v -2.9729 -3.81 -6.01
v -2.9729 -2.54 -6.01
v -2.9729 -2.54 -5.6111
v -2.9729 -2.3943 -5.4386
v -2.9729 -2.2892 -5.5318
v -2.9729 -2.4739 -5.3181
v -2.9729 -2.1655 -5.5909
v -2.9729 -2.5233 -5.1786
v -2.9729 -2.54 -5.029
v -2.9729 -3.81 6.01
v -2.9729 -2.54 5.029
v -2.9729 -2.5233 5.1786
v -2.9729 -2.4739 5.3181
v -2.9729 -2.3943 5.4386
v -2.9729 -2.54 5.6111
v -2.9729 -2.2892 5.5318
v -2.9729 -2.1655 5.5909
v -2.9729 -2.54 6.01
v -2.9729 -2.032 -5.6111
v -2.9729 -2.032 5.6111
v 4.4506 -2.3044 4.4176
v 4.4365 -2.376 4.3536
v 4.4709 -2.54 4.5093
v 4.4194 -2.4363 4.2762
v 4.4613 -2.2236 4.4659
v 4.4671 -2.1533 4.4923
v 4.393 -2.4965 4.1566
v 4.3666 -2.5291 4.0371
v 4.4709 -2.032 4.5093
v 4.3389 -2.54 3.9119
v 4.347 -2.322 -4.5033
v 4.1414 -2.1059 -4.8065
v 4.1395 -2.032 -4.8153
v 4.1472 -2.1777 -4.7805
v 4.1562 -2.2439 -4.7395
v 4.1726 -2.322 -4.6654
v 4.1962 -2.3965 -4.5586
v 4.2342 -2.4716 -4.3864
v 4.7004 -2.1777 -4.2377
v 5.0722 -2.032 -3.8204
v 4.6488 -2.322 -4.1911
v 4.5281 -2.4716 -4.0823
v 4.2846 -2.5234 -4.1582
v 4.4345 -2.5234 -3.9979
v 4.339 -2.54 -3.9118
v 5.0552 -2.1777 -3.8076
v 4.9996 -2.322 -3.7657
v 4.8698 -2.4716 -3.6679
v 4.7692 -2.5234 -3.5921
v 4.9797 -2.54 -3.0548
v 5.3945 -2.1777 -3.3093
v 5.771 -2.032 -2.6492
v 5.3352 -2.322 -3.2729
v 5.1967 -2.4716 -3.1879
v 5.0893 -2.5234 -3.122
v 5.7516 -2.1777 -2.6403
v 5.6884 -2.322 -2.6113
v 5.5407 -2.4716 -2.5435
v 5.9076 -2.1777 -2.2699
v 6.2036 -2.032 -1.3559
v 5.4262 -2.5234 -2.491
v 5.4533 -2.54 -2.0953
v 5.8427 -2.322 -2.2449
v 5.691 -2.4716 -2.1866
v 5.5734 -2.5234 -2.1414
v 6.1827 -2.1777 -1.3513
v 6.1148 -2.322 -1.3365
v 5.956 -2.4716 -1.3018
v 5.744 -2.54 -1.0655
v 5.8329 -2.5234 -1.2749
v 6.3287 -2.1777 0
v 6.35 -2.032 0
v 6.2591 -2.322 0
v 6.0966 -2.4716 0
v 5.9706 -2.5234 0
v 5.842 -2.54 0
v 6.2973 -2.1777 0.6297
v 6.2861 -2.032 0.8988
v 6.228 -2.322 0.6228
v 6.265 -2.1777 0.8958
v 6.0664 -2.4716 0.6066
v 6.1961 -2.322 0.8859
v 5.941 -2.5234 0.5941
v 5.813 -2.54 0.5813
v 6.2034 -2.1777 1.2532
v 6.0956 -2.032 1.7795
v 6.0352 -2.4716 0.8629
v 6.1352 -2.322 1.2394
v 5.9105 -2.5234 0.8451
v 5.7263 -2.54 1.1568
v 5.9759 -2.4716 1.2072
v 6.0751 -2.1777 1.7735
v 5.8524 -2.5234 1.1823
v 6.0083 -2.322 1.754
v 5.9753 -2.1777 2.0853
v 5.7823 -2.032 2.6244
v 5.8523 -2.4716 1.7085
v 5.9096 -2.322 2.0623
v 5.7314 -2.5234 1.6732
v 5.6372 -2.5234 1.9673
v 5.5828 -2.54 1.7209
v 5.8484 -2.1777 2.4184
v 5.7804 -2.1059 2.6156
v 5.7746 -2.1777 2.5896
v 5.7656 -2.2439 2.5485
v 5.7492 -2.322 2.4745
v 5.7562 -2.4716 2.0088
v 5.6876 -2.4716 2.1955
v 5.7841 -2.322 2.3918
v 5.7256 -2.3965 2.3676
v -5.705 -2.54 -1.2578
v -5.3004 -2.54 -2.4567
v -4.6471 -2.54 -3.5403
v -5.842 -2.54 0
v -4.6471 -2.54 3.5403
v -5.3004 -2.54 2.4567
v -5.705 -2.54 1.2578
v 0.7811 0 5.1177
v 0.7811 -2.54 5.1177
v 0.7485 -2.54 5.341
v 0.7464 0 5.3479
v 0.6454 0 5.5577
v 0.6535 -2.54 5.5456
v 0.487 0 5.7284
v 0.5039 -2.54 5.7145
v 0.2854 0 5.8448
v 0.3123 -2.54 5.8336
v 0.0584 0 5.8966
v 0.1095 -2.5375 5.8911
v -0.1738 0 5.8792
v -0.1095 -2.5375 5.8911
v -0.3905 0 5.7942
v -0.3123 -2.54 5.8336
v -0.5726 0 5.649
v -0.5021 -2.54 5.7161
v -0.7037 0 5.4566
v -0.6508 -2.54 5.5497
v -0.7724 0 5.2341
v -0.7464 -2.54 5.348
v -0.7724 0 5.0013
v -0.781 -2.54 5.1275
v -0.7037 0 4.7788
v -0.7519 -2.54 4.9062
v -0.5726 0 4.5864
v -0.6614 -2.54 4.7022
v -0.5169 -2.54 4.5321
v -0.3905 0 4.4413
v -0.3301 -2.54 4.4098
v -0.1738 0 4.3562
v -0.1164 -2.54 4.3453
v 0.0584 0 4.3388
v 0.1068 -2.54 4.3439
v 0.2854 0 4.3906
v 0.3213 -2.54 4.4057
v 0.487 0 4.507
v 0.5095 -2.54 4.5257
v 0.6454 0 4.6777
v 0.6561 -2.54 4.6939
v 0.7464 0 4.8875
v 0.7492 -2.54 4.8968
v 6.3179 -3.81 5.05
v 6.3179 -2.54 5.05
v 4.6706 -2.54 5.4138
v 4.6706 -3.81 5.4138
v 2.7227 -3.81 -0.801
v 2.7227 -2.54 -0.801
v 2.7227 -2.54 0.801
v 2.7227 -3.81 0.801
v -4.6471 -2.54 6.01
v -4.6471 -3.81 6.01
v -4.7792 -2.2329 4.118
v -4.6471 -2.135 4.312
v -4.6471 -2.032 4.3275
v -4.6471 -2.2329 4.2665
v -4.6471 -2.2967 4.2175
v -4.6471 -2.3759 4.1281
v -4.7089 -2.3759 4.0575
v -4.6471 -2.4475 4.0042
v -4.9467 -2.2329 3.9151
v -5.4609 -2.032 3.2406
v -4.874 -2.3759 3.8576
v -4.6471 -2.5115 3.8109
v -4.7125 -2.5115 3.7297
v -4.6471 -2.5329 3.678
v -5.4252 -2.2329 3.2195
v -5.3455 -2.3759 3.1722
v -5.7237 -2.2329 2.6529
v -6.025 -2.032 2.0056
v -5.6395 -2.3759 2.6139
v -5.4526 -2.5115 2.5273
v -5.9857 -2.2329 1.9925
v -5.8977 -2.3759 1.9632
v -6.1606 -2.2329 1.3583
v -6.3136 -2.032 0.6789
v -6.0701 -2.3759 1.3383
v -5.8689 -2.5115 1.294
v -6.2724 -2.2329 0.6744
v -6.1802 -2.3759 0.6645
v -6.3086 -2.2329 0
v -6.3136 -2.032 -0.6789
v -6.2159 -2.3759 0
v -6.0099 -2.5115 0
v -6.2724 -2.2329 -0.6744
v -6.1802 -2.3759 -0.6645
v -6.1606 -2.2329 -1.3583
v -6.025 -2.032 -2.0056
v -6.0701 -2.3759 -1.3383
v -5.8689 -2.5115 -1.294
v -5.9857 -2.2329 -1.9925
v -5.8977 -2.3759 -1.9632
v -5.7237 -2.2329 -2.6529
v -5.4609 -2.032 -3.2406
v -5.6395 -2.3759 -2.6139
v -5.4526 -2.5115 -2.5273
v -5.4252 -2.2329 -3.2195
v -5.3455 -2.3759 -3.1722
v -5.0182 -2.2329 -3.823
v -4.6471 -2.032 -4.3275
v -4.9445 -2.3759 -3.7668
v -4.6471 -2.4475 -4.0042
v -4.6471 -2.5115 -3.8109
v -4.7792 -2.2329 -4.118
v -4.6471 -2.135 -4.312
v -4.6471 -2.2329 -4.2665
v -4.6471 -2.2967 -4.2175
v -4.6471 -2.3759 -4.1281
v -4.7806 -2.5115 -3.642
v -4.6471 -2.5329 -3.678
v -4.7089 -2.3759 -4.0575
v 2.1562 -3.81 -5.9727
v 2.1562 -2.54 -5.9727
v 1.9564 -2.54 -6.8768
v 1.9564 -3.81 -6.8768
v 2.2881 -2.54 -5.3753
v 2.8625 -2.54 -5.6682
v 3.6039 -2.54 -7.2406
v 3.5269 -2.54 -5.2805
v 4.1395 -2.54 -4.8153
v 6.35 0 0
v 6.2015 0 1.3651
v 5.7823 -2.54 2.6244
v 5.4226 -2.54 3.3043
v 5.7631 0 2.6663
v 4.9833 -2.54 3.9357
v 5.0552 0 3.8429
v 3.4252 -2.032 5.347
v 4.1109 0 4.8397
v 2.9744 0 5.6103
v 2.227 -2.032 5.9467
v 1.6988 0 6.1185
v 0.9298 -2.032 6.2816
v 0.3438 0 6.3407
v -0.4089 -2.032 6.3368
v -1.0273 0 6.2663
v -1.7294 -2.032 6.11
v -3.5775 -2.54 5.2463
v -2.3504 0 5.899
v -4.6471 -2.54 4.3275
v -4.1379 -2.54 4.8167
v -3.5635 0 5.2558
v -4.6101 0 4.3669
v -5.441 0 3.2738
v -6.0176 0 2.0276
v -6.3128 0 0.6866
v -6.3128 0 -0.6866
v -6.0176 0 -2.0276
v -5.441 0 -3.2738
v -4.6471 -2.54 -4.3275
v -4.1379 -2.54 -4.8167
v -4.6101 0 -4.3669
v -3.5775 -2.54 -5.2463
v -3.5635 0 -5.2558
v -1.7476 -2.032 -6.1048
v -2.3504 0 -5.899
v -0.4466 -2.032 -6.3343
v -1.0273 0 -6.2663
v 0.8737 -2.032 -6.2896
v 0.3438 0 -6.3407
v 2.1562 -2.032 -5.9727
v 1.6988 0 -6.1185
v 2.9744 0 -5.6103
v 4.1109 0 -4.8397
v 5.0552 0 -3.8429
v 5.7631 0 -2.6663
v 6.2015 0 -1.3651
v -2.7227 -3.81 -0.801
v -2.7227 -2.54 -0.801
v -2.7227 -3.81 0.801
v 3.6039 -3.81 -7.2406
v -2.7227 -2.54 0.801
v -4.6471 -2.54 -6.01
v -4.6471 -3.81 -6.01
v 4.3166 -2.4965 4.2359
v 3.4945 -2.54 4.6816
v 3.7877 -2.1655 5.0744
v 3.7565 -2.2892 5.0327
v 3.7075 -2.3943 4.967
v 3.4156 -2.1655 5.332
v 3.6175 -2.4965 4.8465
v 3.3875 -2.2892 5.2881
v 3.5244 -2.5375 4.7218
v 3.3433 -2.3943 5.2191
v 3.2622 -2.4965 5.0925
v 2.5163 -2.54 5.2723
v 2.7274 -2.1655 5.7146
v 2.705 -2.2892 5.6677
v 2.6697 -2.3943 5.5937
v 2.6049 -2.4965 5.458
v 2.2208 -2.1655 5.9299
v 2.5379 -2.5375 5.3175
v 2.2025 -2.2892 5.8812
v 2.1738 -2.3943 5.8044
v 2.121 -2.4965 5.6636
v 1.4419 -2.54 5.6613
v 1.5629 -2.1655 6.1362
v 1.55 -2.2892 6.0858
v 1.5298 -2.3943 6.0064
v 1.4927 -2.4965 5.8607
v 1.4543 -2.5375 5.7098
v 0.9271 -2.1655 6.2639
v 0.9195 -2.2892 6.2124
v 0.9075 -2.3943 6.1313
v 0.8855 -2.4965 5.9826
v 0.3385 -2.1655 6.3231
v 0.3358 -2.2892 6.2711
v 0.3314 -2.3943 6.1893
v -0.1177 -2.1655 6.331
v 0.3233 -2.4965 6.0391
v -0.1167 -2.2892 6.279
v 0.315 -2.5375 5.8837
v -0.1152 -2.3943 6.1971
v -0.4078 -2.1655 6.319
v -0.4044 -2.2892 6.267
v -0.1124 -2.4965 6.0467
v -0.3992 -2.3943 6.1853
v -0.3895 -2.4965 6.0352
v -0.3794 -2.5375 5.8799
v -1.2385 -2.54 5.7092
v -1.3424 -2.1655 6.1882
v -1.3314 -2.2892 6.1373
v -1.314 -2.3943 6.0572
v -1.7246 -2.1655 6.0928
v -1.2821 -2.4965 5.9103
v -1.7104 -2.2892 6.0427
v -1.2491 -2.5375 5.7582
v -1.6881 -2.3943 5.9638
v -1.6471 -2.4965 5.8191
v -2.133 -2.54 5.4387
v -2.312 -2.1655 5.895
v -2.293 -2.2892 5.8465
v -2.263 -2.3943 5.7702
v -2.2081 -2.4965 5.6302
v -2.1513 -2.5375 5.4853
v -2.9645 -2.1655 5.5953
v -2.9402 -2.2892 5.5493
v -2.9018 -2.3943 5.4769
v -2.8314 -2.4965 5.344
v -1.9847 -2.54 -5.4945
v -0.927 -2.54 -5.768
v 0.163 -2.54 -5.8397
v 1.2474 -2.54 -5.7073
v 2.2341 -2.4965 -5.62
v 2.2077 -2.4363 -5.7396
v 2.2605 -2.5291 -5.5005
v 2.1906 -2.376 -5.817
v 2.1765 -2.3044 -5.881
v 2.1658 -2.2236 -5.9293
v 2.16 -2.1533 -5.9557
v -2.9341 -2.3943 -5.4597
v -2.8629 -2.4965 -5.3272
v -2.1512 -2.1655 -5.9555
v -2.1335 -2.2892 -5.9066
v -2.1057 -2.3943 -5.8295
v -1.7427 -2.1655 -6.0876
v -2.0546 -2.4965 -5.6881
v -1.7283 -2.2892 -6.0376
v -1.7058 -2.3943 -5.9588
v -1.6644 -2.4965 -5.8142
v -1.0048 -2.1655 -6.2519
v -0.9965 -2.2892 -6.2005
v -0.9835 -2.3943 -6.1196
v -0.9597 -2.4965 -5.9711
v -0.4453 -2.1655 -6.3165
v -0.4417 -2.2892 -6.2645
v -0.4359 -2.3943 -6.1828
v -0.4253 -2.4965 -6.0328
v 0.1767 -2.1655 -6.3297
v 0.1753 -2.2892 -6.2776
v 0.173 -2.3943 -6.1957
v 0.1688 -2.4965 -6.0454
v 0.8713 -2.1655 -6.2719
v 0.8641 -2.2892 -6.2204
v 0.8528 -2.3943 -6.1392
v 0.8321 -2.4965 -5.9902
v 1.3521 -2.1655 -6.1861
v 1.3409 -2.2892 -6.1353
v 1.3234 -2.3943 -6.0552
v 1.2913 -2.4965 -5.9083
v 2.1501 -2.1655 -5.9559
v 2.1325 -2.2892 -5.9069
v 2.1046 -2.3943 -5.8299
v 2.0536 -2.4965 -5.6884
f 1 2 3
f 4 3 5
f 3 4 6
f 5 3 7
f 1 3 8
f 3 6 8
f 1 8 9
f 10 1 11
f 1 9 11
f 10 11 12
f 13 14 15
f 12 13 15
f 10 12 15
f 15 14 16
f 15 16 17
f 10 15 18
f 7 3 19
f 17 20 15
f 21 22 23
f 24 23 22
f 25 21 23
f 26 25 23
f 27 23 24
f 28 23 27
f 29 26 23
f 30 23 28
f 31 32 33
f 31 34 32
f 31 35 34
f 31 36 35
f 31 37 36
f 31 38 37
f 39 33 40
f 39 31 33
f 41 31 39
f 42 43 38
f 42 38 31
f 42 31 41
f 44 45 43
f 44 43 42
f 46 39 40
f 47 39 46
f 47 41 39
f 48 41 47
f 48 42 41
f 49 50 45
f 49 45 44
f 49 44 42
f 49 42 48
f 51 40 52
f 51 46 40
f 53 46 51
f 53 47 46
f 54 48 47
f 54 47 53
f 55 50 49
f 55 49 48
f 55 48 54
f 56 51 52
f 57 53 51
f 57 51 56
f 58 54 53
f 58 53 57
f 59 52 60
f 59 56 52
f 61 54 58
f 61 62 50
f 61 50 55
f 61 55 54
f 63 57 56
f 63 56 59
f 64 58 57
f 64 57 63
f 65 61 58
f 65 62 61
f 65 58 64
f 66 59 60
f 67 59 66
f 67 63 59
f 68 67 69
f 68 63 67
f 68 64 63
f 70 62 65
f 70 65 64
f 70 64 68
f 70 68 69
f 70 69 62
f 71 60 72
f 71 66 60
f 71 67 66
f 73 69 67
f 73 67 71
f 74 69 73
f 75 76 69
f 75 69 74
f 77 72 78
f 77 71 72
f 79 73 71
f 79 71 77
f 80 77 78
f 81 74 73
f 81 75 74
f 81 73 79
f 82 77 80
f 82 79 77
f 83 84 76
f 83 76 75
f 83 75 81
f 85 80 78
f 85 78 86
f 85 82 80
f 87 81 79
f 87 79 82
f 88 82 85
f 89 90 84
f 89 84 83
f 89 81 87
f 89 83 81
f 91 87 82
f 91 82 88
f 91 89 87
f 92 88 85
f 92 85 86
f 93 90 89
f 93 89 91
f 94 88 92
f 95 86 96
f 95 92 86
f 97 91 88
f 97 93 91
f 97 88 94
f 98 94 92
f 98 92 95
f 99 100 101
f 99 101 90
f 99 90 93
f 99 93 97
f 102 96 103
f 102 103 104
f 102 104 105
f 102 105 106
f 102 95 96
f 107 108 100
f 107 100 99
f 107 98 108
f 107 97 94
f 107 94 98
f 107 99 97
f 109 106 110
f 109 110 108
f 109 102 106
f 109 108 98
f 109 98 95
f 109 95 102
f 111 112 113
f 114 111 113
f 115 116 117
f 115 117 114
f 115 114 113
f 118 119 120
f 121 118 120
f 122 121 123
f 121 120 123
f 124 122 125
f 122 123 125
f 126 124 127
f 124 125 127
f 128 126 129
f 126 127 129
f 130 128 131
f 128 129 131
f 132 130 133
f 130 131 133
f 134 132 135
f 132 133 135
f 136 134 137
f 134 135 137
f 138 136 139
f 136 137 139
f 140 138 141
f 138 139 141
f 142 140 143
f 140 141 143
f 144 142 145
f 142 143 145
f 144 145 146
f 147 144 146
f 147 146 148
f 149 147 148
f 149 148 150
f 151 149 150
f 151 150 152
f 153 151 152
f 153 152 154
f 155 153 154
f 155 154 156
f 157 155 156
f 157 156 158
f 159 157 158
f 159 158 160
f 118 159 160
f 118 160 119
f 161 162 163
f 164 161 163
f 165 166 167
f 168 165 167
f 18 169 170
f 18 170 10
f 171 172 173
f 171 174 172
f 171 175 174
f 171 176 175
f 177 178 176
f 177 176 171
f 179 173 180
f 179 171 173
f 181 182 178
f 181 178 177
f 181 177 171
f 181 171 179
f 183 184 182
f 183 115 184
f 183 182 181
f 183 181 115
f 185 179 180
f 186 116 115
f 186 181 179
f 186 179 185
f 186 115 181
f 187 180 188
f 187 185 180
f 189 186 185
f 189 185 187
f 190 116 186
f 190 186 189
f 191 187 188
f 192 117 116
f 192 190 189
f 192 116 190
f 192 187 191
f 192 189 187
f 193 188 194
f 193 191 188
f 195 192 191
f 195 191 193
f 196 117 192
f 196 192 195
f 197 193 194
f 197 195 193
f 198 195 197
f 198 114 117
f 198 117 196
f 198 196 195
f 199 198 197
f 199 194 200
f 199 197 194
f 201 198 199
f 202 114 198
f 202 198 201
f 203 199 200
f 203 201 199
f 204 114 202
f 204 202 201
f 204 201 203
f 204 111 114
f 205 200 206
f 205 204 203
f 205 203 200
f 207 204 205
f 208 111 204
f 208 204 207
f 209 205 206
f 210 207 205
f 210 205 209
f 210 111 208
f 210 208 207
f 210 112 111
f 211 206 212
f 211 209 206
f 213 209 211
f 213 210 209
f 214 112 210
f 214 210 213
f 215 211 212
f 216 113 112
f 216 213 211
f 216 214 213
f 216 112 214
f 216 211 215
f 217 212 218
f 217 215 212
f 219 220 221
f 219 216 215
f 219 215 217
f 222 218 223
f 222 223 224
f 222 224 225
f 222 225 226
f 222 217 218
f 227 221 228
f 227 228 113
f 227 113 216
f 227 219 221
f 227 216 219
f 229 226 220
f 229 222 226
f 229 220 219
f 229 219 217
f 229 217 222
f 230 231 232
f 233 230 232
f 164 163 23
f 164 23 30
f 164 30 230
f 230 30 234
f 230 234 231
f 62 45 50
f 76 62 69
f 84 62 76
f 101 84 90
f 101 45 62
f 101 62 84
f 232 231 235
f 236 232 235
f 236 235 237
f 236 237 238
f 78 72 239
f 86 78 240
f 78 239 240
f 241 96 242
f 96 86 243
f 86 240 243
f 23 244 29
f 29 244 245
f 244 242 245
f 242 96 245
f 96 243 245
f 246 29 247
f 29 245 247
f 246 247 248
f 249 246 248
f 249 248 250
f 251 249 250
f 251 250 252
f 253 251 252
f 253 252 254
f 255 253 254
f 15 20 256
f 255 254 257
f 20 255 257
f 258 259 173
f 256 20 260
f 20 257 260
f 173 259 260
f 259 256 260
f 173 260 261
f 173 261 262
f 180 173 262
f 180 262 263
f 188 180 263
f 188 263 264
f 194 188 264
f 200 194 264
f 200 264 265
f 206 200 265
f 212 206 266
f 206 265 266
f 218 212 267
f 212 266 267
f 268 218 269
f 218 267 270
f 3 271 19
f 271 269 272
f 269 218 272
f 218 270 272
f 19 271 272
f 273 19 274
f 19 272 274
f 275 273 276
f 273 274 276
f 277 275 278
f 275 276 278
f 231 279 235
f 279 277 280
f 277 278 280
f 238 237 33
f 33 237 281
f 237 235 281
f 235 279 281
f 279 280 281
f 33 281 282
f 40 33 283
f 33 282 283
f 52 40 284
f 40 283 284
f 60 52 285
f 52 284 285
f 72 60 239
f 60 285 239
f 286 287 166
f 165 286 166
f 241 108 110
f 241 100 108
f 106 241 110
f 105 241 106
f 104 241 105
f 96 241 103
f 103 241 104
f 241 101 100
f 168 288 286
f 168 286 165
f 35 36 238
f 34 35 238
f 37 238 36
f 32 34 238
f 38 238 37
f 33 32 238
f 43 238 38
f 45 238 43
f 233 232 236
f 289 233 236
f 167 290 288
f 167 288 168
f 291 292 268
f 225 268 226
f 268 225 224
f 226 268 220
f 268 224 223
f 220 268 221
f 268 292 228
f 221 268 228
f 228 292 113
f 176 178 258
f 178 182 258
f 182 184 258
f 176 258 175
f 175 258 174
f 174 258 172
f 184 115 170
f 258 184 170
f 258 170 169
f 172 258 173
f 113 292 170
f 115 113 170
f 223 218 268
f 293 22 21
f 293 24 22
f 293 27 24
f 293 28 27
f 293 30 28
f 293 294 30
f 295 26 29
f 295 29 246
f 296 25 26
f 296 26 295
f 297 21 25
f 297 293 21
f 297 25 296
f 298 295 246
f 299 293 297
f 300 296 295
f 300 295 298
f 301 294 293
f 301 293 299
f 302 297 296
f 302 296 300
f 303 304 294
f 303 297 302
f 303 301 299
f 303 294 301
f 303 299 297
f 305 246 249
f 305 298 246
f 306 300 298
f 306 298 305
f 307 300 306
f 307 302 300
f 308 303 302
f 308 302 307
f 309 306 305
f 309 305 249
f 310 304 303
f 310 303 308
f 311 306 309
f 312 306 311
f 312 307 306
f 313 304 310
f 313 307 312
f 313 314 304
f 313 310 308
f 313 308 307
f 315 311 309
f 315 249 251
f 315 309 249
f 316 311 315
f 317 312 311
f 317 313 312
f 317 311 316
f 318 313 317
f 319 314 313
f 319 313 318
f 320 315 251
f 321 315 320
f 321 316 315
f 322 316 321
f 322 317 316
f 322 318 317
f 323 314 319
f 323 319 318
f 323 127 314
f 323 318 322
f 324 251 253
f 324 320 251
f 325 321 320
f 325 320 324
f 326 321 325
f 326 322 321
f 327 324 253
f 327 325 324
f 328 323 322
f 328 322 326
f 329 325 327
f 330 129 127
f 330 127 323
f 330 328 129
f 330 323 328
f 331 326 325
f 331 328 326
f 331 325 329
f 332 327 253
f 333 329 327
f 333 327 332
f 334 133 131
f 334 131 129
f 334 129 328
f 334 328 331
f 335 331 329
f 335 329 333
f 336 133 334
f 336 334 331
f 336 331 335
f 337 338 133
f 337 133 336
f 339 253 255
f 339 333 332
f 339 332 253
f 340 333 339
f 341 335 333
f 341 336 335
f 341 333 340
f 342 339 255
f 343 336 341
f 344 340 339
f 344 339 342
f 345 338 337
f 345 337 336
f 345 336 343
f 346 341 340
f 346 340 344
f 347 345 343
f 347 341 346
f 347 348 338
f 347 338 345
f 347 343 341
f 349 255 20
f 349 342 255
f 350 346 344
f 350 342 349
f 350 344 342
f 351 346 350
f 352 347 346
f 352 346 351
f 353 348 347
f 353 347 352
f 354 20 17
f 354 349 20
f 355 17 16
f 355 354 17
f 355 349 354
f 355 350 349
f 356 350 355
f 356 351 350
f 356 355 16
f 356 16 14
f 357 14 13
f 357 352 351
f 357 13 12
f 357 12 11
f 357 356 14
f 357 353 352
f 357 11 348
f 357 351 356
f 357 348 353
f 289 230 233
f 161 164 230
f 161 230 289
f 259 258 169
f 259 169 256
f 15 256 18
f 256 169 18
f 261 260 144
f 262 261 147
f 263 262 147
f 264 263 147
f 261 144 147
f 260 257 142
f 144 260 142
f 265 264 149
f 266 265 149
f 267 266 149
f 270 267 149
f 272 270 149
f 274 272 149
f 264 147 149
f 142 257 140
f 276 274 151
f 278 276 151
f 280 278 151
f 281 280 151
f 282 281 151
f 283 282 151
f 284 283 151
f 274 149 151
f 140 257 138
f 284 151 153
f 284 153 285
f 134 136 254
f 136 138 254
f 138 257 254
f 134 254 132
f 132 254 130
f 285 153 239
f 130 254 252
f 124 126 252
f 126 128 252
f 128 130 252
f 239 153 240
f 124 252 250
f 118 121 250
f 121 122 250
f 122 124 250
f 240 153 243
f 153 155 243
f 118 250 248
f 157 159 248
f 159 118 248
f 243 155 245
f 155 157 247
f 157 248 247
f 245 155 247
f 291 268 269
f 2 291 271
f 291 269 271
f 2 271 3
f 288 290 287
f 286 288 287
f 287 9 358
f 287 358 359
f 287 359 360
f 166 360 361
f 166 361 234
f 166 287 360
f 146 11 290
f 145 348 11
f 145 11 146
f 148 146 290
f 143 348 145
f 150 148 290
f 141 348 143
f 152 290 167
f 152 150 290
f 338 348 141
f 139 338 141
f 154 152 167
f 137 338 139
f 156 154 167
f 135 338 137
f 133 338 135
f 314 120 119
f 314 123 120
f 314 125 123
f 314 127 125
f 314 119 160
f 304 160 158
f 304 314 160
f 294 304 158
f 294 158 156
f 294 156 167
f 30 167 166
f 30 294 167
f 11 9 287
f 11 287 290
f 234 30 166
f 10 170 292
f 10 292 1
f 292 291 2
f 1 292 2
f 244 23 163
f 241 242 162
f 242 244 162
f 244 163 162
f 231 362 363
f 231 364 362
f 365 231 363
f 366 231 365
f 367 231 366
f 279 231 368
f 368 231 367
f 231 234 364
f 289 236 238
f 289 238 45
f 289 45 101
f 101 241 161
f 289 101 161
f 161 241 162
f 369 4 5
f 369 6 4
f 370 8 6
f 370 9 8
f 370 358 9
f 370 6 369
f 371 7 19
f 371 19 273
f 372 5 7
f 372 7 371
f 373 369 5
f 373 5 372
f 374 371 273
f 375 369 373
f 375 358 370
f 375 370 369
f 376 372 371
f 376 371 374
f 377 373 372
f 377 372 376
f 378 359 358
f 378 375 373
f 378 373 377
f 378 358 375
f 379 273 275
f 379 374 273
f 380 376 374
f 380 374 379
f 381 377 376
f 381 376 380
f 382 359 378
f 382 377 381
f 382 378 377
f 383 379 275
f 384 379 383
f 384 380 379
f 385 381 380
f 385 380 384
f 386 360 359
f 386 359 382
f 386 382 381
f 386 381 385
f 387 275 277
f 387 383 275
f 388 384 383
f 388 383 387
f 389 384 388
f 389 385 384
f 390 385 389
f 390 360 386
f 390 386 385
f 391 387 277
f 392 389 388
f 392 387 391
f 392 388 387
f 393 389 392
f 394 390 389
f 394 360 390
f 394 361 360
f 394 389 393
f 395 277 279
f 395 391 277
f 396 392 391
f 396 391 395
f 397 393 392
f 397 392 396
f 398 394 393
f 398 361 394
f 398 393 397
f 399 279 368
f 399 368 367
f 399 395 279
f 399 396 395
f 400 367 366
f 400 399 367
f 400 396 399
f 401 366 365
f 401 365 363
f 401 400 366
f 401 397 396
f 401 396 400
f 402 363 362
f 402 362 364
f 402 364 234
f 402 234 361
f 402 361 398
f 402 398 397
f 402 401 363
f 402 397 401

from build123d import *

# Parameters (mm, degrees)
F0_R          = 6.35
F1_DEPTH      = 2.54
F2_W          = 1.6741803847
F2_H          = 6.0100271367
F3_DEPTH      = 1.27
F4_W          = 5.4453448392
F4_H          = 0.8010258316
F5_DEPTH      = 1.27
F7_DEPTH      = 1.27
F8_R          = 0.7810995879
F9_DEPTH      = 25.4
F10_T4_ANGLE  = 60.776700367
F10_T9_ANGLE  = 70.6868696842
F10_T15_ANGLE = 108.8474457798
F10_T20_ANGLE = 95.5948420913
F10_T26_ANGLE = 35.8710937336


# Not quite as in the source:
# - a fillet or chamfer that OpenCascade refuses, or shapes differently, is made with other operations: its cross-section is extruded or revolved along the edge and cut away or added
# - a feature of the source that left no trace in its solid (it failed there, or was rolled back) is left out


with BuildPart() as f1:
    # F0 (on Front) → F1 (new body)
    with BuildSketch(Plane.XZ):
        Circle(F0_R)
    extrude(amount=F1_DEPTH)

    # F2 (on face) → F3 (join)
    with BuildSketch(Plane.XZ.offset(2.54)):
        with Locations((-3.81, 3.0050135683)):
            Rectangle(F2_W, F2_H)
        with Locations((-3.81, -3.0050135683)):
            Rectangle(F2_W, F2_H)
    extrude(amount=F3_DEPTH)

    # F4 (on face) → F5 (join)
    with BuildSketch(Plane.XZ.offset(2.54)):
        with Locations((0, 0.4005129158)):
            Rectangle(F4_W, F4_H)
        with Locations((0, -0.4005129158)):
            Rectangle(F4_W, F4_H)
    extrude(amount=F5_DEPTH)

    # F6 (on face) → F7 (join)
    with BuildSketch(Plane.XZ.offset(2.54)):
        Polygon((4.6705882996, 5.4137986153), (2.1562074386, -5.9727103966), (1.9563709538, -6.8768215956), (3.6039068937, -7.2406322096), (6.3179433579, 5.0500279438), align=None)
    extrude(amount=F7_DEPTH)

    # F8 (on face) → F9 (cut)
    with BuildSketch(Plane.XZ.offset(2.54)):
        with Locations((0, 5.1177083515)):
            Circle(F8_R)
    extrude(amount=-F9_DEPTH, mode=Mode.SUBTRACT)

    # F10: fillet of radius 0.508 on 5 edges, made by hand


with BuildPart() as f10_tool2:
    # F10_s3 → F10_t4 (revolve)
    with BuildSketch(Plane(origin=(0, 0, 0), x_dir=(0, 1, 0), z_dir=(-0.8727236144, 0, -0.4882145972))):
        with BuildLine():
            ThreePointArc((-2.032, 6.35), (-2.3912102448, 6.2012102448), (-2.54, 5.842))
            Line((-2.54, 5.842), (-2.54, 6.35))
            Line((-2.54, 6.35), (-2.032, 6.35))
        make_face()
    revolve(axis=Axis((0, -2.54, 0), (0, -1, 0)), revolution_arc=F10_T4_ANGLE)

    split(bisect_by=Plane(origin=(4.9608883724, 0, -1.0954685729), x_dir=(0, 1, 0), z_dir=(0.9764759285, 0, -0.2156264386)), keep=Keep.TOP)


with BuildPart() as f1_1:
    add(f1.part)

    # F10_t1: cut F10_tool2
    add(f10_tool2.part, mode=Mode.SUBTRACT)


with BuildPart() as f10_tool7:
    # F10_s8 → F10_t9 (revolve)
    with BuildSketch(Plane(origin=(0, 0, 0), x_dir=(0, 1, 0), z_dir=(-0.7729956778, 0, 0.6344112878))):
        with BuildLine():
            ThreePointArc((-2.032, 6.35), (-2.3912102448, 6.2012102448), (-2.54, 5.842))
            Line((-2.54, 5.842), (-2.54, 6.35))
            Line((-2.54, 6.35), (-2.032, 6.35))
        make_face()
    revolve(axis=Axis((0, -2.54, 0), (0, -1, 0)), revolution_arc=F10_T9_ANGLE)

    split(bisect_by=Plane.YZ.offset(-2.9729098076), keep=Keep.TOP)

    split(bisect_by=Plane(origin=(3.313533314, 0, -0.7316979013), x_dir=(0, 1, 0), z_dir=(-0.9764759285, 0, 0.2156264386)), keep=Keep.TOP)


with BuildPart() as f1_2:
    add(f1_1.part)

    # F10_t6: cut F10_tool7
    add(f10_tool7.part, mode=Mode.SUBTRACT)


with BuildPart() as f10_tool13:
    # F10_s14 → F10_t15 (revolve)
    with BuildSketch(Plane(origin=(0, 0, 0), x_dir=(0, 1, 0), z_dir=(0.813341715, 0, 0.581786262))):
        with BuildLine():
            ThreePointArc((-2.032, 6.35), (-2.3912102448, 6.2012102448), (-2.54, 5.842))
            Line((-2.54, 5.842), (-2.54, 6.35))
            Line((-2.54, 6.35), (-2.032, 6.35))
        make_face()
    revolve(axis=Axis((0, -2.54, 0), (0, -1, 0)), revolution_arc=F10_T15_ANGLE)

    split(bisect_by=Plane.YZ.offset(-4.6470901924), keep=Keep.BOTTOM)


with BuildPart() as f1_3:
    add(f1_2.part)

    # F10_t12: cut F10_tool13
    add(f10_tool13.part, mode=Mode.SUBTRACT)


with BuildPart() as f10_tool18:
    # F10_s19 → F10_t20 (revolve)
    with BuildSketch(Plane(origin=(0, 0, 0), x_dir=(0, 1, 0), z_dir=(0.5560518892, 0, -0.8311475781))):
        with BuildLine():
            ThreePointArc((-2.032, 6.35), (-2.3912102448, 6.2012102448), (-2.54, 5.842))
            Line((-2.54, 5.842), (-2.54, 6.35))
            Line((-2.54, 6.35), (-2.032, 6.35))
        make_face()
    revolve(axis=Axis((0, -2.54, 0), (0, -1, 0)), revolution_arc=F10_T20_ANGLE)

    split(bisect_by=Plane.YZ.offset(-2.9729098076), keep=Keep.TOP)

    split(bisect_by=Plane(origin=(3.313533314, 0, -0.7316979013), x_dir=(0, 1, 0), z_dir=(-0.9764759285, 0, 0.2156264386)), keep=Keep.TOP)


with BuildPart() as f1_4:
    add(f1_3.part)

    # F10_t17: cut F10_tool18
    add(f10_tool18.part, mode=Mode.SUBTRACT)


with BuildPart() as f10_tool24:
    # F10_s25 → F10_t26 (revolve)
    with BuildSketch(Plane.XY):
        with BuildLine():
            ThreePointArc((6.35, -2.032), (6.2012102448, -2.3912102448), (5.842, -2.54))
            Line((5.842, -2.54), (6.35, -2.54))
            Line((6.35, -2.54), (6.35, -2.032))
        make_face()
    revolve(axis=Axis((0, -2.54, 0), (0, -1, 0)), revolution_arc=F10_T26_ANGLE)

    split(bisect_by=Plane(origin=(4.9608883724, 0, -1.0954685729), x_dir=(0, 1, 0), z_dir=(0.9764759285, 0, -0.2156264386)), keep=Keep.TOP)


with BuildPart() as f1_5:
    add(f1_4.part)

    # F10_t23: cut F10_tool24
    add(f10_tool24.part, mode=Mode.SUBTRACT)


solid = f1_5.part
